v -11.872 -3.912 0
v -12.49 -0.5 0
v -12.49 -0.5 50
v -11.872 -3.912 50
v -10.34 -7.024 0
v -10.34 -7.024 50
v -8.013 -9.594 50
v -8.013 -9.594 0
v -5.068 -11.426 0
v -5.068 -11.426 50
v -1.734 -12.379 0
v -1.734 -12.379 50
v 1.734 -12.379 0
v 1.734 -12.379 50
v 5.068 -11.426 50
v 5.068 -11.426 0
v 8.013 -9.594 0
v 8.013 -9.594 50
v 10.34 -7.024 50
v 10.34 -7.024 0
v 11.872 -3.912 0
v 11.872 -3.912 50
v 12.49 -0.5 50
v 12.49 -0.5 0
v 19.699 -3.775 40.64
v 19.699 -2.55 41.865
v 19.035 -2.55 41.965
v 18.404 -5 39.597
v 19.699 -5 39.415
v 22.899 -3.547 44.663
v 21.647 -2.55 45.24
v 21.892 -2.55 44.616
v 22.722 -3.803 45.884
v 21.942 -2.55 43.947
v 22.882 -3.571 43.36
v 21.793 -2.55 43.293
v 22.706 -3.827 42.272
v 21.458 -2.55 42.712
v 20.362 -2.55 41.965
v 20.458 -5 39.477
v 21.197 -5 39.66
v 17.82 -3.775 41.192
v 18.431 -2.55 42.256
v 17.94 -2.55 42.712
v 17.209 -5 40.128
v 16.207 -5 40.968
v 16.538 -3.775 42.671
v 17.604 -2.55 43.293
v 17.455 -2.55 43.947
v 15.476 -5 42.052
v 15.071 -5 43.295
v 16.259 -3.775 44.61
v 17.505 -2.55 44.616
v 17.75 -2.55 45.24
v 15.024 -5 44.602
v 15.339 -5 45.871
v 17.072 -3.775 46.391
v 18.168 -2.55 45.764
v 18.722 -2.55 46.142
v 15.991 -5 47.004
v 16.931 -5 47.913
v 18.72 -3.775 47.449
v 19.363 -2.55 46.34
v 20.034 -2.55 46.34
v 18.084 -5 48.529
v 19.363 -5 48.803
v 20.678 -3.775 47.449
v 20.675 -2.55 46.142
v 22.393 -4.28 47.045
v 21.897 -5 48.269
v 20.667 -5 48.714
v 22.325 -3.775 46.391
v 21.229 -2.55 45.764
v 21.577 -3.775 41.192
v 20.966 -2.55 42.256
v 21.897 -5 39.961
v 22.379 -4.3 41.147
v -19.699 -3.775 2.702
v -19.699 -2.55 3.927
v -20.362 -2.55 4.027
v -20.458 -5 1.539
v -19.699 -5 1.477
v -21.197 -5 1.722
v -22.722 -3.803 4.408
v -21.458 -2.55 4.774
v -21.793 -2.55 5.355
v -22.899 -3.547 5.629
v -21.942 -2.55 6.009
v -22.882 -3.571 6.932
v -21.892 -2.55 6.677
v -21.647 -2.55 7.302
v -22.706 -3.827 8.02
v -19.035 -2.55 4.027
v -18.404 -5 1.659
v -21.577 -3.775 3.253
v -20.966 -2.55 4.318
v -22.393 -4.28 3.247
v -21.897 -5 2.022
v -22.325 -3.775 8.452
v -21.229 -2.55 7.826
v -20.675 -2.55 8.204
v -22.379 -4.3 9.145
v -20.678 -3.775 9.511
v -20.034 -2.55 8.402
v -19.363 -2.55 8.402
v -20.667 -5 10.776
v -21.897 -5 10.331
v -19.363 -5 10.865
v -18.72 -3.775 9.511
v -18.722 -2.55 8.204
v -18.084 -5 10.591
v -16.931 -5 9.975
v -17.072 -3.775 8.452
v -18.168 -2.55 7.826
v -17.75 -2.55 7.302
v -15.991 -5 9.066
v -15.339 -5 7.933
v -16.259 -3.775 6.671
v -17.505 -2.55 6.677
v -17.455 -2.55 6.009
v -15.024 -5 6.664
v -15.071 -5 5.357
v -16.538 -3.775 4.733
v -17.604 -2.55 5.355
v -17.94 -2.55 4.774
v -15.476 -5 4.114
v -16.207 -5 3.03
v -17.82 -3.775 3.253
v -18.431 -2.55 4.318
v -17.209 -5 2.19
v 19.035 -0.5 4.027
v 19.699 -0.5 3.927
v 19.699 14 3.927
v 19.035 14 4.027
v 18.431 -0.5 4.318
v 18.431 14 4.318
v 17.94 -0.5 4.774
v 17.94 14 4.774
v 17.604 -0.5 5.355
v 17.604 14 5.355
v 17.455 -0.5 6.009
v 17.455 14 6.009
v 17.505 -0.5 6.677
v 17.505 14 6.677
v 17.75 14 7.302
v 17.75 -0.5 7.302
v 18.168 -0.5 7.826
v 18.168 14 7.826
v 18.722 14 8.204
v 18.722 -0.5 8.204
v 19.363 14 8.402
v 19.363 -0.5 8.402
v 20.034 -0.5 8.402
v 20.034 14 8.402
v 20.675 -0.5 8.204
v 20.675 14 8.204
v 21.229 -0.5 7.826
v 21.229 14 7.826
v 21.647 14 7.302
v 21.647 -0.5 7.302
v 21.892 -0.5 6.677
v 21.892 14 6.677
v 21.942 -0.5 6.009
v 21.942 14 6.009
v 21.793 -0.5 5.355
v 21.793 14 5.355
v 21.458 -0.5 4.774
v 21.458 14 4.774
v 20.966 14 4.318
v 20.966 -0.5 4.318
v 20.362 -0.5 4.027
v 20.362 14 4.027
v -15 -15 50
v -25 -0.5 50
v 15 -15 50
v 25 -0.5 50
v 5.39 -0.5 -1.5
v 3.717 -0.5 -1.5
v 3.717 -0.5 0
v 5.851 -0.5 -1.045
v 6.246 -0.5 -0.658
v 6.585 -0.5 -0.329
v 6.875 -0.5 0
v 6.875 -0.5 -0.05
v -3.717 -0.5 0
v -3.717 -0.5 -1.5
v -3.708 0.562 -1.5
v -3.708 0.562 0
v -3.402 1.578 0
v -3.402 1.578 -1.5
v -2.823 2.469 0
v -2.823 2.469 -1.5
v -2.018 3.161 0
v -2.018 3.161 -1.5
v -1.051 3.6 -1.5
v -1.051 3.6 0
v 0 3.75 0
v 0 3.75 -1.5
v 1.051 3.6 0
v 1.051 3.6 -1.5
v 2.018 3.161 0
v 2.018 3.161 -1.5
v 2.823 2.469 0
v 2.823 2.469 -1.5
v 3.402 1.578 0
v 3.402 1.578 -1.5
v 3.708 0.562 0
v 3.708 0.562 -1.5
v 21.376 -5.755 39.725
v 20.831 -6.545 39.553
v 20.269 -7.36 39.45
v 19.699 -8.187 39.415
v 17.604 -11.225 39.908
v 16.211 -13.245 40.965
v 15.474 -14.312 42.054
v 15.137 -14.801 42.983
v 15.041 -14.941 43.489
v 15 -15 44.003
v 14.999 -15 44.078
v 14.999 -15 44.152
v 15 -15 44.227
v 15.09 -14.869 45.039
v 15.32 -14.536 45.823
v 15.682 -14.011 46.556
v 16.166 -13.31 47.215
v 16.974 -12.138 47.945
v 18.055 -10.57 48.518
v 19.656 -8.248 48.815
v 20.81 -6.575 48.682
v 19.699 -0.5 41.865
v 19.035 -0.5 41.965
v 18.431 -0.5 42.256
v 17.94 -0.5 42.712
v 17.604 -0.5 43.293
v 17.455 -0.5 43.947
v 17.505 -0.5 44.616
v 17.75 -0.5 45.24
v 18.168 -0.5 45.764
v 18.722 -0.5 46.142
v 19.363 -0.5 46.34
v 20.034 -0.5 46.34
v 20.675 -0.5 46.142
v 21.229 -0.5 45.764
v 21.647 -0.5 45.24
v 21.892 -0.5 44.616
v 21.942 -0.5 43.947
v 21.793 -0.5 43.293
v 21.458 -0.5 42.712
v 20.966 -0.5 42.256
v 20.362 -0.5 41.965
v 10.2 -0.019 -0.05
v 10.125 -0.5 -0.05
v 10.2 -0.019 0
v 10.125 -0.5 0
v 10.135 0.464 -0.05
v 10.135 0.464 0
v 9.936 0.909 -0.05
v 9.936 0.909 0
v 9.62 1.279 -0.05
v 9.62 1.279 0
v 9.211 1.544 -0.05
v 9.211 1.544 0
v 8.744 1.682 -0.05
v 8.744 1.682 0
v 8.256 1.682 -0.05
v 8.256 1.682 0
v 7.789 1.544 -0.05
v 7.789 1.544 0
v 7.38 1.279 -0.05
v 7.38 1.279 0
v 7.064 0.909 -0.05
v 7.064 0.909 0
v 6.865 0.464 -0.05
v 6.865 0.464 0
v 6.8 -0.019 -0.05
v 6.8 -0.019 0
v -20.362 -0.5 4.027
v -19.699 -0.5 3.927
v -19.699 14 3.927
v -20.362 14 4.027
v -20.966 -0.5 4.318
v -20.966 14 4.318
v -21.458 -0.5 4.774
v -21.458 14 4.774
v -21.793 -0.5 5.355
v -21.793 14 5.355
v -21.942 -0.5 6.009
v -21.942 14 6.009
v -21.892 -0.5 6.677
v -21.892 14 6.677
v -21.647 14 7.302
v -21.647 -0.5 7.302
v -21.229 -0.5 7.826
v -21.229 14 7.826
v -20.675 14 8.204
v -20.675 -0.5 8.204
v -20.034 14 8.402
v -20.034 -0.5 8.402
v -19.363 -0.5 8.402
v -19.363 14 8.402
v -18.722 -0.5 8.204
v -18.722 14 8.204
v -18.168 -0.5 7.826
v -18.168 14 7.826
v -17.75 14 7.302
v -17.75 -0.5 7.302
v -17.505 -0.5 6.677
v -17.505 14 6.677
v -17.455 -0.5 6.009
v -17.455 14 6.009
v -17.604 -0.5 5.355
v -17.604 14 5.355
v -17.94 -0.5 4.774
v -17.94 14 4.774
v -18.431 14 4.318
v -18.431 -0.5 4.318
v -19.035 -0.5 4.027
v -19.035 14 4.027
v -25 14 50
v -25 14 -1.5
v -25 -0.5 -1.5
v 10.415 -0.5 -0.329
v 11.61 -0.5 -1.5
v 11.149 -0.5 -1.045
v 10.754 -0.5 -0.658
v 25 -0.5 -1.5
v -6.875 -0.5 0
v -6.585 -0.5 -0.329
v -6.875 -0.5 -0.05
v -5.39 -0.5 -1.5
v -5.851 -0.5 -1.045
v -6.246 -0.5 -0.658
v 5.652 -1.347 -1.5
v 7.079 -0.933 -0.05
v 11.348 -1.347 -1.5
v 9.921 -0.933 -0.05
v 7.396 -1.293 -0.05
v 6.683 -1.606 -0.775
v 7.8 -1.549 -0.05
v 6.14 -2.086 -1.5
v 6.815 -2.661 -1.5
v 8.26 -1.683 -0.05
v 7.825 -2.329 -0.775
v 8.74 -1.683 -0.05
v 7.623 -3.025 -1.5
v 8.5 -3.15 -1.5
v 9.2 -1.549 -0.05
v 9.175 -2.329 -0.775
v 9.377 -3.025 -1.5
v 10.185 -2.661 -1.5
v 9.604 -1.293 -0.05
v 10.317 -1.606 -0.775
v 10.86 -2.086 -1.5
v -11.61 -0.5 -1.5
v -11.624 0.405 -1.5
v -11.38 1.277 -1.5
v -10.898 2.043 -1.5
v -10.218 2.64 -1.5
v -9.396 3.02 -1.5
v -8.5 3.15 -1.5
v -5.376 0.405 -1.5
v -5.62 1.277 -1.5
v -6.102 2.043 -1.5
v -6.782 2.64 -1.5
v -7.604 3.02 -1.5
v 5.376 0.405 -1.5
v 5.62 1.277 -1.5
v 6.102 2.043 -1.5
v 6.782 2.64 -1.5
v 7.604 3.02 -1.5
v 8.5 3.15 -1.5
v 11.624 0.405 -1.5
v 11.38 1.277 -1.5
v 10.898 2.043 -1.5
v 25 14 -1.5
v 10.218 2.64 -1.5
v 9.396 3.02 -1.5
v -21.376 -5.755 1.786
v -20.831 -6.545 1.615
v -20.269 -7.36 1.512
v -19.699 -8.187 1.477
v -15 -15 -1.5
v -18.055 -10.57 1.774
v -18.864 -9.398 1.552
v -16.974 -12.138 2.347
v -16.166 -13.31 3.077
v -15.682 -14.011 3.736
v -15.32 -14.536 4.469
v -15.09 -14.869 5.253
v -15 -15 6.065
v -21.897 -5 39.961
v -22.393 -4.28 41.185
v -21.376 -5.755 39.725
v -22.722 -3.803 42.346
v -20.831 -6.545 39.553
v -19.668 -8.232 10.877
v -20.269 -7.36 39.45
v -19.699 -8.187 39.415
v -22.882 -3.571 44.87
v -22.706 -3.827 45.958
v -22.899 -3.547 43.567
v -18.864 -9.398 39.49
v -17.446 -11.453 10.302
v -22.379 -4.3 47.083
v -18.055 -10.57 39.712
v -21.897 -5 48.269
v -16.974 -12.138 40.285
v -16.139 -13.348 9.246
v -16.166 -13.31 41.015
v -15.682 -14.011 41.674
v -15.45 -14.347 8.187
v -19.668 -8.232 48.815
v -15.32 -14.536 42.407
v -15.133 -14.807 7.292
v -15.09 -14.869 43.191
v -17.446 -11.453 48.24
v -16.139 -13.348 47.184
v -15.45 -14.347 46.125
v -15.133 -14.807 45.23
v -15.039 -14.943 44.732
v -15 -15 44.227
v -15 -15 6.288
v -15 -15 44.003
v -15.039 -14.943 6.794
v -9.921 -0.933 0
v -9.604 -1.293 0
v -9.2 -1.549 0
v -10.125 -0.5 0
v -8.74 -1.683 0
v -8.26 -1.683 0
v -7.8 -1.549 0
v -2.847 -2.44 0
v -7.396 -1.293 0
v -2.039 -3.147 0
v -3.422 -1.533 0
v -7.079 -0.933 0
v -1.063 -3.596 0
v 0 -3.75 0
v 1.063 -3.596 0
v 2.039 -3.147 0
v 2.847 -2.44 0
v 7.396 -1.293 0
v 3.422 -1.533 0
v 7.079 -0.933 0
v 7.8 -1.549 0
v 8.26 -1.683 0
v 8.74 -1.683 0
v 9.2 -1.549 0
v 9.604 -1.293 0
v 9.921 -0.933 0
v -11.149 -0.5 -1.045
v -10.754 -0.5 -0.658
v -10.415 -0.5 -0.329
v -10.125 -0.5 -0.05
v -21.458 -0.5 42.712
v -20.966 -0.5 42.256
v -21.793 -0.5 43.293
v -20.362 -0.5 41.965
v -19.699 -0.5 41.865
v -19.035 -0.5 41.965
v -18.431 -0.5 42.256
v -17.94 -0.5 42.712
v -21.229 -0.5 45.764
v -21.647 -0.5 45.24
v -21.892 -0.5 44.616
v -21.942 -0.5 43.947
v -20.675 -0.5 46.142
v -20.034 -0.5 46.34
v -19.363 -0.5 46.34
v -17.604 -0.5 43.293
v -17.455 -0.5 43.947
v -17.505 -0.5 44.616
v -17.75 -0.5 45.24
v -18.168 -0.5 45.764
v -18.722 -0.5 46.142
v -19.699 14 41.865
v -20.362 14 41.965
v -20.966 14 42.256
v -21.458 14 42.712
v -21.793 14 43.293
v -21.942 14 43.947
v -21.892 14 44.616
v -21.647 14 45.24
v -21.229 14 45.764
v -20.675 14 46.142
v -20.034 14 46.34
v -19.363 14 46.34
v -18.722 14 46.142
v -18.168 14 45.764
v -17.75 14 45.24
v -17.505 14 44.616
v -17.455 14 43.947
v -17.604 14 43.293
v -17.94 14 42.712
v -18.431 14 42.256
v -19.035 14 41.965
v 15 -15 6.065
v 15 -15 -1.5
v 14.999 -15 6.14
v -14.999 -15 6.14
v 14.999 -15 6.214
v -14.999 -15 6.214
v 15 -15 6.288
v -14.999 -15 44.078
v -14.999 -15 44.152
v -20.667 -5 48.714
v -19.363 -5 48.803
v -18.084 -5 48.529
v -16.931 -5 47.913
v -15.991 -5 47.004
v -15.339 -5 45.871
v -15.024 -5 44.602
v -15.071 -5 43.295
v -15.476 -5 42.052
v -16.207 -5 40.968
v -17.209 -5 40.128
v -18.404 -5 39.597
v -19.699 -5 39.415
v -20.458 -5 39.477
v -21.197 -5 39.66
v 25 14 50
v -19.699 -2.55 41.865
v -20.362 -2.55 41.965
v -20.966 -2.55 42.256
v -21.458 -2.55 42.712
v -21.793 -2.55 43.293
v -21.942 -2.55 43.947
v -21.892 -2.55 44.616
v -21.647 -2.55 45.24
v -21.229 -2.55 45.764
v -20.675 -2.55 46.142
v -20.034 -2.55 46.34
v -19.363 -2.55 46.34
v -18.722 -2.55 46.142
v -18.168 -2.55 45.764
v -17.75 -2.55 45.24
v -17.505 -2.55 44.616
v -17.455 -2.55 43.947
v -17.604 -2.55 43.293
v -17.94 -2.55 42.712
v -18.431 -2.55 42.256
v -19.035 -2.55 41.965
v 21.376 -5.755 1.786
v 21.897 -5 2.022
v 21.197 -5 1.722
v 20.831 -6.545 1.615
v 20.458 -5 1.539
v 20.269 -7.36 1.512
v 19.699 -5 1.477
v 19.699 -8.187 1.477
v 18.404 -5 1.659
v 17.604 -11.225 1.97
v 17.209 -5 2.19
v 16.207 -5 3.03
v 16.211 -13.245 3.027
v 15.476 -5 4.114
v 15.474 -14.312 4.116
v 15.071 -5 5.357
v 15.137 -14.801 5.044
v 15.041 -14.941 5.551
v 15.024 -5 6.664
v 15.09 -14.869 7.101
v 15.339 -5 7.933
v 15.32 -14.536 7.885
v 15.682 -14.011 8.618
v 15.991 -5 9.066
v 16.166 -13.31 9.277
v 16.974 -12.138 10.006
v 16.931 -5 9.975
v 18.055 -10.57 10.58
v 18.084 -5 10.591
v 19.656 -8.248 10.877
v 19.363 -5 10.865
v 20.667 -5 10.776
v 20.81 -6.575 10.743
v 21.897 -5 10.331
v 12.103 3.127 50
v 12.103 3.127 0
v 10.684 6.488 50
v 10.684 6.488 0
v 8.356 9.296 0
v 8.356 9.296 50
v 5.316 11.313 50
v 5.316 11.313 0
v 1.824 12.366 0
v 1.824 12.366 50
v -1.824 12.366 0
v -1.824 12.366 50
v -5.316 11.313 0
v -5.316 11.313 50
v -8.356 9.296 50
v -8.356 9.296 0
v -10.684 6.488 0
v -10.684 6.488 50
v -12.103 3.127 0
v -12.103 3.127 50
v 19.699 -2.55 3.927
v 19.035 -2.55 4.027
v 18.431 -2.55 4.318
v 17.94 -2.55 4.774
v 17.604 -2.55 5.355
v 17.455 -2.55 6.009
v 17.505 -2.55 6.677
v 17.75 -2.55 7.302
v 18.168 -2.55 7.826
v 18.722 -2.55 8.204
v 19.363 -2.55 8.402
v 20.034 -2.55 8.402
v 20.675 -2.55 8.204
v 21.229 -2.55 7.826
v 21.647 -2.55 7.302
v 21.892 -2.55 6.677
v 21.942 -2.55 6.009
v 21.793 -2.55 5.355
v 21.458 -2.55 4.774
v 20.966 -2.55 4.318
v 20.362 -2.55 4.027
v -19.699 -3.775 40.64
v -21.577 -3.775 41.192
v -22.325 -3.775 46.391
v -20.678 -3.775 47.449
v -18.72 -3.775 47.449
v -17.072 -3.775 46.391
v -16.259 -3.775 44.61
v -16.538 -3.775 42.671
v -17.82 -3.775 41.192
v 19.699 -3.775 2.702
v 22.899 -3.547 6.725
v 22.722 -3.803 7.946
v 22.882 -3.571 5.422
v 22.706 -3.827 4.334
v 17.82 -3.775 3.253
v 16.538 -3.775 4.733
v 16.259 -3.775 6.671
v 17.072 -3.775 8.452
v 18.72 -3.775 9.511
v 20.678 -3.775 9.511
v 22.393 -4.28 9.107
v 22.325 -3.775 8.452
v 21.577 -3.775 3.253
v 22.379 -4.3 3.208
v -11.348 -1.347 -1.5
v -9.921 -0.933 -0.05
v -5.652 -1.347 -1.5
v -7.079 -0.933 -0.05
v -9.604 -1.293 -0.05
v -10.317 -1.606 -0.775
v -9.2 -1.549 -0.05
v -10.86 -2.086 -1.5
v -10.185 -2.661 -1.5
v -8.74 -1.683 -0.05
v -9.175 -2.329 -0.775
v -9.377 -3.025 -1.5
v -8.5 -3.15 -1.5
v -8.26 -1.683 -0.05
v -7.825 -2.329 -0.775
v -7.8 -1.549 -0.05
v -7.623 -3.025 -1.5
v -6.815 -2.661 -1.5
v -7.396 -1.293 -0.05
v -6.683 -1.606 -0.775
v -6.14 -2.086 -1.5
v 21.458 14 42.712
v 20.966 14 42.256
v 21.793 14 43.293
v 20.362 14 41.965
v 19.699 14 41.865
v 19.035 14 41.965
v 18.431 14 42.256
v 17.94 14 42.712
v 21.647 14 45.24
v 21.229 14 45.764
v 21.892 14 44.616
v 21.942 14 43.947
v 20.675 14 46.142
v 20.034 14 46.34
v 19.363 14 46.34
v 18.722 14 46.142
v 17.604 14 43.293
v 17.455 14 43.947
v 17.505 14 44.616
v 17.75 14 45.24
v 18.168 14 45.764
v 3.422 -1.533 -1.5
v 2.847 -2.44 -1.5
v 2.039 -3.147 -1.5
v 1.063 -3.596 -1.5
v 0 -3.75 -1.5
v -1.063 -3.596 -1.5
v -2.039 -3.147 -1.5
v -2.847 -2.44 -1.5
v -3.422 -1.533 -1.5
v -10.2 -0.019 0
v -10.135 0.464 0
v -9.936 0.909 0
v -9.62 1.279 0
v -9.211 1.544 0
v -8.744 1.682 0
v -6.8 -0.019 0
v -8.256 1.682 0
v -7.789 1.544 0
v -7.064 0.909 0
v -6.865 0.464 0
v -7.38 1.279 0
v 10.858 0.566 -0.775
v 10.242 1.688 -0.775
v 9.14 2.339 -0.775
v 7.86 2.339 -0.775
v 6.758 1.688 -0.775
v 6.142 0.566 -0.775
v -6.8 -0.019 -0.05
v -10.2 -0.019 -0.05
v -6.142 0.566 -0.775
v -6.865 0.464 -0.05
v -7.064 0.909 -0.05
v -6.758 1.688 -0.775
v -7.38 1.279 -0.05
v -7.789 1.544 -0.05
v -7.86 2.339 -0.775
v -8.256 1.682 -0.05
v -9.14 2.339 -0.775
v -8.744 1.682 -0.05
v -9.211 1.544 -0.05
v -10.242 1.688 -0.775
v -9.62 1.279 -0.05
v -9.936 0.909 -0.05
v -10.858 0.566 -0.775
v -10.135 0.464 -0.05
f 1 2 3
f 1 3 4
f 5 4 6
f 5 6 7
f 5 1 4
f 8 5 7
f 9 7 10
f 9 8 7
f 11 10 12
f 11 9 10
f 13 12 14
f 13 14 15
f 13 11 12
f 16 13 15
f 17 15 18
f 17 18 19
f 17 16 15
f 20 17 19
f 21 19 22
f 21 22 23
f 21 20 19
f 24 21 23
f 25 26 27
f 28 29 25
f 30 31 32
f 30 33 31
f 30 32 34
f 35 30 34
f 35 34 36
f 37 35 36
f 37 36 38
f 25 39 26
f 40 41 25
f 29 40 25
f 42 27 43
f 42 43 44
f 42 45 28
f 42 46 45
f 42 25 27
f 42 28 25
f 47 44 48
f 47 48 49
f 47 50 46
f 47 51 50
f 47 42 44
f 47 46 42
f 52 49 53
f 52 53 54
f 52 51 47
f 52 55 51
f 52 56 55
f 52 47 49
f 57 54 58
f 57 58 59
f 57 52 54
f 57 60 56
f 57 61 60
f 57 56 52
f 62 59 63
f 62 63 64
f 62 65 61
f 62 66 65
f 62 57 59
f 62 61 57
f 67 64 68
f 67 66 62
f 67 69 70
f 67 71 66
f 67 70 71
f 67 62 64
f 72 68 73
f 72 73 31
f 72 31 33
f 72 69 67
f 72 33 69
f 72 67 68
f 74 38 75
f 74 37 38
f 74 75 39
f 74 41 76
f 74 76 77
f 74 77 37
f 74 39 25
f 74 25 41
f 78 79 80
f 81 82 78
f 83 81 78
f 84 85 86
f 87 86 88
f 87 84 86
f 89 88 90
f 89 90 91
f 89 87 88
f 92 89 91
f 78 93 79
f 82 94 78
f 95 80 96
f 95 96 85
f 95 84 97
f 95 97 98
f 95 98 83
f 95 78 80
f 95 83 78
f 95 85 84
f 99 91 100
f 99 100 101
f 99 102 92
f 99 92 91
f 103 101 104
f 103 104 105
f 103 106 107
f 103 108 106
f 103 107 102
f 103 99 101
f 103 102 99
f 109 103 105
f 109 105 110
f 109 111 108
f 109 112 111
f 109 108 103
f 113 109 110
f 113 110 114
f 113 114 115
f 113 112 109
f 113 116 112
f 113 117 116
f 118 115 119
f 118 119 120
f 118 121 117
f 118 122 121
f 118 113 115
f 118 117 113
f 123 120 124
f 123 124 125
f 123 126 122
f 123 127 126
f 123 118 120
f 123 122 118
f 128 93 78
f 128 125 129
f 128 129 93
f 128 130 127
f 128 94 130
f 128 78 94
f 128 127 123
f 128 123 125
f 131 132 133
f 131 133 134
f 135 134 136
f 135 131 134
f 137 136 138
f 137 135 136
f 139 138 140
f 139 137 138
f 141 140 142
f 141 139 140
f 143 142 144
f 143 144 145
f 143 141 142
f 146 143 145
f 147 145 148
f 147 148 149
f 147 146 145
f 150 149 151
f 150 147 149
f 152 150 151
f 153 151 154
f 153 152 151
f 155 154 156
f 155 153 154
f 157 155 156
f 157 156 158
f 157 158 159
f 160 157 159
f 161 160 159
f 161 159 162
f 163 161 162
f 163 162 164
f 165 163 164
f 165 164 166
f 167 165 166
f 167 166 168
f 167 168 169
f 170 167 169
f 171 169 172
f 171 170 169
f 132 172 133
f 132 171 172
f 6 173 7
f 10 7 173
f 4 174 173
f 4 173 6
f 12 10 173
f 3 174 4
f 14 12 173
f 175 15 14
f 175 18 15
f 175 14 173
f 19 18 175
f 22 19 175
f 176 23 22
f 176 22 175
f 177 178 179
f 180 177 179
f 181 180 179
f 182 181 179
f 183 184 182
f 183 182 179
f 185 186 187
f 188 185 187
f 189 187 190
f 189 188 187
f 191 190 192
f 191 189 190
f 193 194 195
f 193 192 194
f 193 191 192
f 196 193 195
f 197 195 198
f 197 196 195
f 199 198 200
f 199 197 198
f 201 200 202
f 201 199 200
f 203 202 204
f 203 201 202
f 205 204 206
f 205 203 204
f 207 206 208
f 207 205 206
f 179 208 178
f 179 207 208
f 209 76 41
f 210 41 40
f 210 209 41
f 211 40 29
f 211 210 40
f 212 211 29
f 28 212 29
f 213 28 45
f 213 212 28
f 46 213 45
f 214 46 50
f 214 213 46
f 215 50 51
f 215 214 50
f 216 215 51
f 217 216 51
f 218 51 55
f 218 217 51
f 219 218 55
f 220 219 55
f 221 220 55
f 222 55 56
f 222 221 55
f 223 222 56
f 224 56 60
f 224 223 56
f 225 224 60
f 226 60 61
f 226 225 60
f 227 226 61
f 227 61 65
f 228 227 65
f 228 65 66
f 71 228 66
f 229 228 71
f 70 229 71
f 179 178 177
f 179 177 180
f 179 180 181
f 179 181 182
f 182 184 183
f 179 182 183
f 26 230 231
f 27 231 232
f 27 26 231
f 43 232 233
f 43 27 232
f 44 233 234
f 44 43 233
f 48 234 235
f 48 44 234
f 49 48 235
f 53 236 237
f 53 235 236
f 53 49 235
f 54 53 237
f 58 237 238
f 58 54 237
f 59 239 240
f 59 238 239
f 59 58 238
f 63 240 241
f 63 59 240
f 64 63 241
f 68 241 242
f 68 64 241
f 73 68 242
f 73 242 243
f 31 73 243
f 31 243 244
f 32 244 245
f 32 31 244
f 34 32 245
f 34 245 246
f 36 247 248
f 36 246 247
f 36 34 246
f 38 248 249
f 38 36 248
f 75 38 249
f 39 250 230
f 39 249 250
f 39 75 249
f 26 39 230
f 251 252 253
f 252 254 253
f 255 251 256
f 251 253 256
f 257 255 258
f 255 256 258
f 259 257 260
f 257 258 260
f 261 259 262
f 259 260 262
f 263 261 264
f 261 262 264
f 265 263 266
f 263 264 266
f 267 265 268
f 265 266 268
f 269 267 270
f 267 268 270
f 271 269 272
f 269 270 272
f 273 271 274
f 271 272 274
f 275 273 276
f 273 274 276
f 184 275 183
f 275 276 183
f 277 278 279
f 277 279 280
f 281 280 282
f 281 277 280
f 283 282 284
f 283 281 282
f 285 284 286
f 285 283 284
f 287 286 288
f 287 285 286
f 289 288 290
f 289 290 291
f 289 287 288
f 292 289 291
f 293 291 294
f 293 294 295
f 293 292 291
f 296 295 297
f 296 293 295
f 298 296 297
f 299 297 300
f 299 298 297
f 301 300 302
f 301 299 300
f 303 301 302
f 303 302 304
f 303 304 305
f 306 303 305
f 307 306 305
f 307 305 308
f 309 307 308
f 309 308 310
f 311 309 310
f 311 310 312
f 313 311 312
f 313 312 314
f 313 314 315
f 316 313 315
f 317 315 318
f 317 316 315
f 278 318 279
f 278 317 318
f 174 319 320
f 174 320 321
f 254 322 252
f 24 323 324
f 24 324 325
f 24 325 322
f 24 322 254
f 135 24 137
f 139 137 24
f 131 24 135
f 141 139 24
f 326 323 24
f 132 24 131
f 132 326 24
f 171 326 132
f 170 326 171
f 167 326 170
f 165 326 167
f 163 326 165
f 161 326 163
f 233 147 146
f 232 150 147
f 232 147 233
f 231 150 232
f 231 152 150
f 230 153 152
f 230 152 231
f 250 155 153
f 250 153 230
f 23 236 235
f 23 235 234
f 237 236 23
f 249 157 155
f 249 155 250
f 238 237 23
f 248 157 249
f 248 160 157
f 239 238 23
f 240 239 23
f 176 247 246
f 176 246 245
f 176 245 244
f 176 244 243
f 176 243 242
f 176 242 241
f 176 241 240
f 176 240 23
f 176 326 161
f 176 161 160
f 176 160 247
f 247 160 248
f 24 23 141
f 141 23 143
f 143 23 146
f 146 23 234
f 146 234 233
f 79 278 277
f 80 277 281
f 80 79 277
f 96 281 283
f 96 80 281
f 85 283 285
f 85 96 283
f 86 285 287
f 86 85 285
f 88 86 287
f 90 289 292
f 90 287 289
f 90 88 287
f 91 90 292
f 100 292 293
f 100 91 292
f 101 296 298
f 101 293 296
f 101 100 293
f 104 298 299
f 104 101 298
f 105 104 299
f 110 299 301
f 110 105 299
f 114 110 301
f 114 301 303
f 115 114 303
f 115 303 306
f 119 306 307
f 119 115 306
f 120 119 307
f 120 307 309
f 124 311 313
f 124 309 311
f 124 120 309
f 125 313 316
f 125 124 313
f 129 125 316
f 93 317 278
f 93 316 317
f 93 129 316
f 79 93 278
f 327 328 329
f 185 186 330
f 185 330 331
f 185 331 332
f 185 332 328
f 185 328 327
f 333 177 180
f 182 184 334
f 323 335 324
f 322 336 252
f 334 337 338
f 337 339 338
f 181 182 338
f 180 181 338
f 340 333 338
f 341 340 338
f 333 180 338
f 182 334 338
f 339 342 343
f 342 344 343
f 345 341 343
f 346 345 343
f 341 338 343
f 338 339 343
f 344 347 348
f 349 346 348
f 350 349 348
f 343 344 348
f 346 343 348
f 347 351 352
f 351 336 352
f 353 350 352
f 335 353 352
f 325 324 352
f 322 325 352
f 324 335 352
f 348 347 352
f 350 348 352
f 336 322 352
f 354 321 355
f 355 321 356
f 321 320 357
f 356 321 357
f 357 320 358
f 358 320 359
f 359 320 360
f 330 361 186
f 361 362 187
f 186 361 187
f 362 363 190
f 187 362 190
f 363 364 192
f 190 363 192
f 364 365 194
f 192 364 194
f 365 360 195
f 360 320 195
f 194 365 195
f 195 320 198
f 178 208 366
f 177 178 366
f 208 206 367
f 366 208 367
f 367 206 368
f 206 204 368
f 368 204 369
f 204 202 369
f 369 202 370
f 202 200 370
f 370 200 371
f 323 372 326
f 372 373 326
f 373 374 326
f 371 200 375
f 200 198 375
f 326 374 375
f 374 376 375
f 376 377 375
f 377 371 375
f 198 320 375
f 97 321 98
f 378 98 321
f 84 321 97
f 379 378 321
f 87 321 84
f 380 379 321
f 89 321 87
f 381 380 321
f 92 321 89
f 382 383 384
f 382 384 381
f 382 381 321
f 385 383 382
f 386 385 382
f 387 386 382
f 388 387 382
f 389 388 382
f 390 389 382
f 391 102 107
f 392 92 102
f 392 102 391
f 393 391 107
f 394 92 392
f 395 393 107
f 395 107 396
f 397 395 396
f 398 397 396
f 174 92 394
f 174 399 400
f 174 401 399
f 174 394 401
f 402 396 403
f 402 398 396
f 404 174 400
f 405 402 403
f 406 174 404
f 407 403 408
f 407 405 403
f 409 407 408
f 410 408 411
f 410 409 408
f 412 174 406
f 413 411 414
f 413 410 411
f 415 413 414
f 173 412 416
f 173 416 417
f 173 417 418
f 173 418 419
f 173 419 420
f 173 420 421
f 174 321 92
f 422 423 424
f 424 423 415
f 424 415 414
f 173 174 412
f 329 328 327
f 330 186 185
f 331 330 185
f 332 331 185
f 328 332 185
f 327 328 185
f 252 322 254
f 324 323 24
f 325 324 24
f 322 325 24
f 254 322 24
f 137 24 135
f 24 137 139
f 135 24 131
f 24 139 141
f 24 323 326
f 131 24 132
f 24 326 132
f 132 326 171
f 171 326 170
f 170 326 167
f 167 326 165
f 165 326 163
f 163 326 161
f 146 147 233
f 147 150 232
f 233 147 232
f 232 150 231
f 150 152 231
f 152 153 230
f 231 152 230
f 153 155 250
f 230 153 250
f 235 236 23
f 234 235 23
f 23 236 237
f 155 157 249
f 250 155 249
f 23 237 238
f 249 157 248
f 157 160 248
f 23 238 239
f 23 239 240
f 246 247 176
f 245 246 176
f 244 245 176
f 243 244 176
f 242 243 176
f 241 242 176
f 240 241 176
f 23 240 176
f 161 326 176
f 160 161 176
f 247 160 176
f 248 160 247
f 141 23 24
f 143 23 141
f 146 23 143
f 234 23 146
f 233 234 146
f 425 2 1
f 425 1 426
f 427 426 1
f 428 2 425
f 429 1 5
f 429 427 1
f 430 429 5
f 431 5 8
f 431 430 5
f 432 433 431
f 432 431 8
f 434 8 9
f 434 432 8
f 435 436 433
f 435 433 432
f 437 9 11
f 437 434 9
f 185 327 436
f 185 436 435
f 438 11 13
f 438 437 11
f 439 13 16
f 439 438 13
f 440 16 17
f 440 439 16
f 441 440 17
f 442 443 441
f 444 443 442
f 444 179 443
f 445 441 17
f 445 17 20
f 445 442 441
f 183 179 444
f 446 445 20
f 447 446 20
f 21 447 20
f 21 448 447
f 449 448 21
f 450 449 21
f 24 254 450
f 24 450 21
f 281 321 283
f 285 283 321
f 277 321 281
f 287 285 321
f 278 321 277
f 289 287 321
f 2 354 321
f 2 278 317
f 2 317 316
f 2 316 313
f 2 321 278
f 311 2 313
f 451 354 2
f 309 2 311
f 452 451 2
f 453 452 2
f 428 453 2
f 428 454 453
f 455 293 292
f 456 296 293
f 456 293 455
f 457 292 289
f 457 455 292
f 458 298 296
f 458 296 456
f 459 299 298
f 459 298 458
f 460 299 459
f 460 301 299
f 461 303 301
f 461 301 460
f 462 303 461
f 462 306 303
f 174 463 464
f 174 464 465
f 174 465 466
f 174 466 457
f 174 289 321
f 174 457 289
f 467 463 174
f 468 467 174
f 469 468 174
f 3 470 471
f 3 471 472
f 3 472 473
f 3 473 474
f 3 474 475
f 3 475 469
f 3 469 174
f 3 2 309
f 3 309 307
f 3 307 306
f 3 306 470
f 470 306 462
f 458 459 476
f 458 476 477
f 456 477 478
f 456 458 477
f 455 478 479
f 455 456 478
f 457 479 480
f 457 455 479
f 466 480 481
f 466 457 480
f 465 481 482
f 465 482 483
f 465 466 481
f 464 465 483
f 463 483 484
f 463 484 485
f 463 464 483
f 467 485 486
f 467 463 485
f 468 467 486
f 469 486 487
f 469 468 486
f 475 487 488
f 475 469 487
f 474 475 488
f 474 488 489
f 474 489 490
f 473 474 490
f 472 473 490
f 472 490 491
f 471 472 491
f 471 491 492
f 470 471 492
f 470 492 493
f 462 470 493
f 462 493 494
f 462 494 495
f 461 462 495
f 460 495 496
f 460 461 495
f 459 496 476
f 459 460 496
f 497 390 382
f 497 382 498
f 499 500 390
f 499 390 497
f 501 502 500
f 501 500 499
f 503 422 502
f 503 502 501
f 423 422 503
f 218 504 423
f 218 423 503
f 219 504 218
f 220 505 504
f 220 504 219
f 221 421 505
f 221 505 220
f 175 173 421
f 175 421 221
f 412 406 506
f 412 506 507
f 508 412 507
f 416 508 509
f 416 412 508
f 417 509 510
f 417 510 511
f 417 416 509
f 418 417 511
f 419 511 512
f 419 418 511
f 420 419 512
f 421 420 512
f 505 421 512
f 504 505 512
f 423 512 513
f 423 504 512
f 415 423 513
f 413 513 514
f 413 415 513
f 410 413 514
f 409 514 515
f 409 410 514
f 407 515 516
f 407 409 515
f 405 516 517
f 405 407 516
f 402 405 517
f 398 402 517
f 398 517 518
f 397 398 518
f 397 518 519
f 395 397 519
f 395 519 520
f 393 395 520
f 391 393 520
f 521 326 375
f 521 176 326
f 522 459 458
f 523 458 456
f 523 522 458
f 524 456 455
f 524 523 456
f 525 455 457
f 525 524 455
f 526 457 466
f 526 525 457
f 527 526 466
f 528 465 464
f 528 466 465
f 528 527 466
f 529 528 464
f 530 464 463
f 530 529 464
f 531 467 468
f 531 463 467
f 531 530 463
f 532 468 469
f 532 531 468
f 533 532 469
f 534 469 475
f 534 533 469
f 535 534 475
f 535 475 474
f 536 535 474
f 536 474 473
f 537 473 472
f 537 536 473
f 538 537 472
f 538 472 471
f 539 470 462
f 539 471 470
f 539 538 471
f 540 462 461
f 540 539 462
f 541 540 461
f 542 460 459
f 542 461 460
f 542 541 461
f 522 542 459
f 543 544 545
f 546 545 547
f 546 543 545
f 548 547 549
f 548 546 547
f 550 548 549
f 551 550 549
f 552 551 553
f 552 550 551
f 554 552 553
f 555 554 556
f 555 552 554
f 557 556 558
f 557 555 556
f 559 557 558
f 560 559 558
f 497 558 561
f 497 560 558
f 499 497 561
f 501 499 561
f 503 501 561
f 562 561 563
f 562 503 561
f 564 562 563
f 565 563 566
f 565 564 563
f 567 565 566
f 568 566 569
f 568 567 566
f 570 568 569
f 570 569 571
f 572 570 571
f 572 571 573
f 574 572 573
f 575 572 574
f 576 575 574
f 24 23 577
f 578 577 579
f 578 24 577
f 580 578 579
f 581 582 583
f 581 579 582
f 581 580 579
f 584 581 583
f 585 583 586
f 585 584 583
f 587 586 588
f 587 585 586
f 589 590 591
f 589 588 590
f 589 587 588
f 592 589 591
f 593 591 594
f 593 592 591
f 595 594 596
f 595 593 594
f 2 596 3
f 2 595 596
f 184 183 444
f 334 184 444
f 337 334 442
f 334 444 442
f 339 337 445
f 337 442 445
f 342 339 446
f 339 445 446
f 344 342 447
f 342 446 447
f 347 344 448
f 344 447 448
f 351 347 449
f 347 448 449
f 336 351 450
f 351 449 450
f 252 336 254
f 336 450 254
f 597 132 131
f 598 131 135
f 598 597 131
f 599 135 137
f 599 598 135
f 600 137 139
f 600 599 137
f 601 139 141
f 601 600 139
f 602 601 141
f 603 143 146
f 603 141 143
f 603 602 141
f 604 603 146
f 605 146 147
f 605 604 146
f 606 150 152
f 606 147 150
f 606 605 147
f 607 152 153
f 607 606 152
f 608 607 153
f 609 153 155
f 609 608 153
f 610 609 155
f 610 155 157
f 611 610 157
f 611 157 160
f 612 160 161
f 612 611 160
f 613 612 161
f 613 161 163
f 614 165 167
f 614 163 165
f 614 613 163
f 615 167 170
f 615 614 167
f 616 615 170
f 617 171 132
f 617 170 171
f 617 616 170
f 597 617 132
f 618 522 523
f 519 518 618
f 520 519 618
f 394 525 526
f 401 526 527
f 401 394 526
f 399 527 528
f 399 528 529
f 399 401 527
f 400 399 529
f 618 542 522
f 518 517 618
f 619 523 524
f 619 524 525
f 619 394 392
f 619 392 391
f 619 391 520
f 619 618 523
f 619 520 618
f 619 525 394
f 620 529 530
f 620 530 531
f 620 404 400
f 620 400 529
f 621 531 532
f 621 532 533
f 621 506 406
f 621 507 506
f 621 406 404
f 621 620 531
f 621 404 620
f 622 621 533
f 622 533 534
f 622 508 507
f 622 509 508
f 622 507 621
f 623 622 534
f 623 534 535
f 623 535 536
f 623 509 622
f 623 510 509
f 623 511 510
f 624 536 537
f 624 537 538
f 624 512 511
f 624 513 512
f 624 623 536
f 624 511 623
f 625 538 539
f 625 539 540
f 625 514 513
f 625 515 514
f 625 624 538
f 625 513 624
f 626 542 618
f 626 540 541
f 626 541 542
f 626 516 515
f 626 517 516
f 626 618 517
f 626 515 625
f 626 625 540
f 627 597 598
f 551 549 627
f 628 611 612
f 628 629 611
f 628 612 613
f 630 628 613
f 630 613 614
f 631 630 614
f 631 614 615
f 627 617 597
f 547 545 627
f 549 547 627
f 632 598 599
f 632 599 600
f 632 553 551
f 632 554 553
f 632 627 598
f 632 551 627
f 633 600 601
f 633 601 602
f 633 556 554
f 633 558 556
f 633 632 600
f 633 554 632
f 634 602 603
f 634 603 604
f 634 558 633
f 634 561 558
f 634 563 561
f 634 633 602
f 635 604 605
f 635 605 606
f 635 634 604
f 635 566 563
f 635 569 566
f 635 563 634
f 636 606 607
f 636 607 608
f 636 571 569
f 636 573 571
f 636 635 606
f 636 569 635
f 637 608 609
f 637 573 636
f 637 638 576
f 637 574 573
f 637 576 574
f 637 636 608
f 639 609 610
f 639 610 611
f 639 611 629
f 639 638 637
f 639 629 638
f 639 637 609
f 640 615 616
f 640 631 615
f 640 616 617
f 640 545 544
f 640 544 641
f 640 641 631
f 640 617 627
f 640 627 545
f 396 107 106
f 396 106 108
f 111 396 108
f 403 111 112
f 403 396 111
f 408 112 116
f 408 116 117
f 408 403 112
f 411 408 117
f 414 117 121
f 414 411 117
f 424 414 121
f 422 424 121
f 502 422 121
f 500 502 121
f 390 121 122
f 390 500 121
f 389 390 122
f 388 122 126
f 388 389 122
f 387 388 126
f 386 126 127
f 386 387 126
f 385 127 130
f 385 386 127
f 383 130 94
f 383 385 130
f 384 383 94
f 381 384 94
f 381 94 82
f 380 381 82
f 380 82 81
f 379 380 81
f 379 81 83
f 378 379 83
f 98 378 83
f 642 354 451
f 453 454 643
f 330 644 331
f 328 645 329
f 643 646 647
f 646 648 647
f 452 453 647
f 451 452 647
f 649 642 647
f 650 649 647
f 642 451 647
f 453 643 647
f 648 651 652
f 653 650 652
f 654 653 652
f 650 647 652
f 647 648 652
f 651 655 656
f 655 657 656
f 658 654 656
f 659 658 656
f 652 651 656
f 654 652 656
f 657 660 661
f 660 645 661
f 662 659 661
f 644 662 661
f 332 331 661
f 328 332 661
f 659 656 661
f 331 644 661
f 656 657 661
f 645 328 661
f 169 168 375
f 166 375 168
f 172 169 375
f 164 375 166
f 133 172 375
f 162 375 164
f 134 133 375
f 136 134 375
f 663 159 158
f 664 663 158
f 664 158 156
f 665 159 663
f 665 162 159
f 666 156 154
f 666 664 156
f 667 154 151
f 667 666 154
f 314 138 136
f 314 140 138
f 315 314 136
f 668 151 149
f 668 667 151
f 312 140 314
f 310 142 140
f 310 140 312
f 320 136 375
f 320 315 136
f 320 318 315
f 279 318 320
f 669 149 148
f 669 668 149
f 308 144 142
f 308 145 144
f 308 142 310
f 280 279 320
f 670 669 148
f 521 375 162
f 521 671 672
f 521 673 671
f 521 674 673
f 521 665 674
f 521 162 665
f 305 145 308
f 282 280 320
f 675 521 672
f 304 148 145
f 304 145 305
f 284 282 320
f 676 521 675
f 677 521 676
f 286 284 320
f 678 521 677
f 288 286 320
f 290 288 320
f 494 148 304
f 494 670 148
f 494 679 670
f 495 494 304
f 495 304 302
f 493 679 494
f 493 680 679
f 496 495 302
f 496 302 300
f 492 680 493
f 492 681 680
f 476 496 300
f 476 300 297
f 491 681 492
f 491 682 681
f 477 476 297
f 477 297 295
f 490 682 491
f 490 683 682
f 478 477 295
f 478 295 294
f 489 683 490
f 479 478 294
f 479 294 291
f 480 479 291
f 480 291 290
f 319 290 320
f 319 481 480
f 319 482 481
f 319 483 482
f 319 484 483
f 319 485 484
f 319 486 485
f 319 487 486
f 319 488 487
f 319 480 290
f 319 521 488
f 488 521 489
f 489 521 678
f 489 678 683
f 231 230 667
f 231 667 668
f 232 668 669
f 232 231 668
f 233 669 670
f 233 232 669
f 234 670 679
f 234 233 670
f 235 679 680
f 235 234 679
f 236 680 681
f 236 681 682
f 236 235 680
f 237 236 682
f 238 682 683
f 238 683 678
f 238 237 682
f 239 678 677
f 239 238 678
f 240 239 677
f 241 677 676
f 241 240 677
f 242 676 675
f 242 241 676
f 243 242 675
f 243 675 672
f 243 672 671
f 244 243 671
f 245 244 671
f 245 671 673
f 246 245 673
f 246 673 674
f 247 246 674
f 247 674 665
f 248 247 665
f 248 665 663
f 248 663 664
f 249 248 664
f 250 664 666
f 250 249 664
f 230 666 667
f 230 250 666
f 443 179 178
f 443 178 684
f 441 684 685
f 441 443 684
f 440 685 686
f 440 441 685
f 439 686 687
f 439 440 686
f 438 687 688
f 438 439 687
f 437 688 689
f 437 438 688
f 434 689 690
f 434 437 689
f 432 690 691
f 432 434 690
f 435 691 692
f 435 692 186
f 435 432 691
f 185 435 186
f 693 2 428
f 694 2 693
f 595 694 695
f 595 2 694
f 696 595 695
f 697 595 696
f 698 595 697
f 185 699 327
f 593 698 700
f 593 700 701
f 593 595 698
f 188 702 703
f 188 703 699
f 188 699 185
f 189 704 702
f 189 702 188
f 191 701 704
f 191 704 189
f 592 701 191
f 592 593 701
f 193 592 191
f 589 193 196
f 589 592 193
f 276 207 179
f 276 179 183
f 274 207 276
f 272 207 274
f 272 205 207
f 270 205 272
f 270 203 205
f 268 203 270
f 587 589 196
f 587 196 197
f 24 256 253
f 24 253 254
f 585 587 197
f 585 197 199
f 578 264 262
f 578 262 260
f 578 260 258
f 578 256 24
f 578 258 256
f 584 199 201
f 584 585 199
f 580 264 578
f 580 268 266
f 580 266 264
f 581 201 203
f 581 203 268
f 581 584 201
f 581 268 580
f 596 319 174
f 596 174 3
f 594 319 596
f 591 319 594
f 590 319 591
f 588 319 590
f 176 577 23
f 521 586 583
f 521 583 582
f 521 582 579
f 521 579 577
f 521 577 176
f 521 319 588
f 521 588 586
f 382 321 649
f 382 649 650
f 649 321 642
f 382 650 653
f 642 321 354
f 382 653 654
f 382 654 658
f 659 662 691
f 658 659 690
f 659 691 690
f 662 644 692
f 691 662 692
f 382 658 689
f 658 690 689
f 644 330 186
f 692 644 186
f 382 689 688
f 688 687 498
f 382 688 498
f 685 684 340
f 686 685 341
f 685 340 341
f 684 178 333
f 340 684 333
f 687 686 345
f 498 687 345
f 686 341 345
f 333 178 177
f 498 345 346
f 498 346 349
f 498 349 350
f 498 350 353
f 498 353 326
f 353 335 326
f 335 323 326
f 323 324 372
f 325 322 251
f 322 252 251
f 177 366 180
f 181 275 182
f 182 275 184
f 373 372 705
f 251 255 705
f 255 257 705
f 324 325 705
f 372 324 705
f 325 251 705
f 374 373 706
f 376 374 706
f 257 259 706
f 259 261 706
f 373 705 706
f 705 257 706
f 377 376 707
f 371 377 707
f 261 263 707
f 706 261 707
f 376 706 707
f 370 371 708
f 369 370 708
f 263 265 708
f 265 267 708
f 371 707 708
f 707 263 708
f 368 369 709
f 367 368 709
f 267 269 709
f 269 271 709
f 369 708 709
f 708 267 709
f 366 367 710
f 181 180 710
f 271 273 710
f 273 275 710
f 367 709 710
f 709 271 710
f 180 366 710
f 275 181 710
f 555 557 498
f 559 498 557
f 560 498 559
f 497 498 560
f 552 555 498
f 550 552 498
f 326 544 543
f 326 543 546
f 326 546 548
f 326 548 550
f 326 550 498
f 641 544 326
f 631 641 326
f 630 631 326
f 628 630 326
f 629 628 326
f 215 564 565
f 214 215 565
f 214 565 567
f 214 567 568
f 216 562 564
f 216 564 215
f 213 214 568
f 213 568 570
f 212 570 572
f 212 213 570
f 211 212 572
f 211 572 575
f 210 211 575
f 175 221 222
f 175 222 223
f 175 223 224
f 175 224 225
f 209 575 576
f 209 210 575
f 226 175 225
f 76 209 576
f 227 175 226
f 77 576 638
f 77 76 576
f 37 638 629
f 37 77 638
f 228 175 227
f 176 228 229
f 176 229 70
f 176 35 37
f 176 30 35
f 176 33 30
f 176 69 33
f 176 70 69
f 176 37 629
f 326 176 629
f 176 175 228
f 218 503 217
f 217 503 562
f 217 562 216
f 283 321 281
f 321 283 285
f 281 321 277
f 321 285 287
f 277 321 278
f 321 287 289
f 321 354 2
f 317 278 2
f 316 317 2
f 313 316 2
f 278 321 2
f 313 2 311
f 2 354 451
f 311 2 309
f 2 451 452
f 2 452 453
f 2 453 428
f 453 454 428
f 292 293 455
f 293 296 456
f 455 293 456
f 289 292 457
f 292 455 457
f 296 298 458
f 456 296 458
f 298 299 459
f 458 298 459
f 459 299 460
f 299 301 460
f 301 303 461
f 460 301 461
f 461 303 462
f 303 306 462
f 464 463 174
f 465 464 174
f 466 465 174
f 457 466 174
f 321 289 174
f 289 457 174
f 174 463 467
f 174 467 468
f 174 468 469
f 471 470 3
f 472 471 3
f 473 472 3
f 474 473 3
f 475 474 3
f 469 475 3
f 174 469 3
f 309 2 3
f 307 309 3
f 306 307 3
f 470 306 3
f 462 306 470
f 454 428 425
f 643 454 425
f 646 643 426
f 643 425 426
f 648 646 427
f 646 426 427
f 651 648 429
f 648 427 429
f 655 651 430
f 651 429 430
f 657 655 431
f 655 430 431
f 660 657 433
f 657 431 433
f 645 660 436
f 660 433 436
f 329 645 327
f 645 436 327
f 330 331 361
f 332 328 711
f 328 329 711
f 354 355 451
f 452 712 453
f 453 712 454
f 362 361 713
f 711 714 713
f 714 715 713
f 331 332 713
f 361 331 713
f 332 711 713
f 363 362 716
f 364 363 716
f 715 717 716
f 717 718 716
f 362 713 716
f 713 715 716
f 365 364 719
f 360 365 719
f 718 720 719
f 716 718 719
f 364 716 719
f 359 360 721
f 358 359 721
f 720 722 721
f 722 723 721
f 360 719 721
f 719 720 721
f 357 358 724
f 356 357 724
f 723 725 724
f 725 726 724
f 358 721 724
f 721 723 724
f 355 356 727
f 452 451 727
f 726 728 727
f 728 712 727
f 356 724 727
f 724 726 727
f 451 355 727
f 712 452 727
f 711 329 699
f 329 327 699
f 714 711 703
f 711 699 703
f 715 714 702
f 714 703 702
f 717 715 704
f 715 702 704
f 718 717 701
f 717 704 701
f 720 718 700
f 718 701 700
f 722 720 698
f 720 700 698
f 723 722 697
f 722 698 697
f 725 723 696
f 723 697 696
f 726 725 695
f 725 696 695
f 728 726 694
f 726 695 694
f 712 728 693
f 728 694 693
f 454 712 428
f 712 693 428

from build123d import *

# Parameters (mm, degrees)
ESQUISSE1_W                                    = 10
ESQUISSE1_H                                    = 14.5
ESQUISSE1_W_2                                  = 30
ESQUISSE1_H_2                                  = 29
ESQUISSE1_R                                    = 12.5
BOSS_EXTRU_1_DEPTH                             = 50
FRAISAGE_POUR_VIS_T_TE_FRAIS_E_M41_AT_COUNT    = 2
FRAISAGE_POUR_VIS_T_TE_FRAIS_E_M41_AT_PITCH    = 39.397349882
FRAISAGE_POUR_VIS_T_TE_FRAIS_E_M41_2_COUNT     = 2
FRAISAGE_POUR_VIS_T_TE_FRAIS_E_M41_2_PITCH     = 54.694216744
FRAISAGE_POUR_VIS_T_TE_FRAIS_E_M41_3_COUNT     = 2
FRAISAGE_POUR_VIS_T_TE_FRAIS_E_M41_3_PITCH     = 37.938188775
ESQUISSE26_R                                   = 3.75
BOSS_EXTRU_2_DEPTH                             = 1.5
FRAISAGE_POUR_VIS_T_TE_FRAIS_E_M31_D           = 3.4
FRAISAGE_POUR_VIS_T_TE_FRAIS_E_M31_CSINK_D     = 6.3
FRAISAGE_POUR_VIS_T_TE_FRAIS_E_M31_CSINK_ANGLE = 90


with BuildPart() as part:
    # Esquisse1 → Boss.-Extru.1 (new body)
    # profile 1 of 5: a face of its own
    with BuildSketch(Plane.XY):
        with Locations((-20, 6.75)):
            Rectangle(ESQUISSE1_W, ESQUISSE1_H)
    # profile 2 of 5: a face of its own
    with BuildSketch(Plane.XY):
        Polygon((-15, -15), (-15, -0.5), (-25, -0.5), align=None)
    # profile 3 of 5: a face of its own
    with BuildSketch(Plane.XY):
        with Locations((0, -0.5)):
            Rectangle(ESQUISSE1_W_2, ESQUISSE1_H_2)
        Circle(ESQUISSE1_R, mode=Mode.SUBTRACT)
    # profile 4 of 5: a face of its own
    with BuildSketch(Plane.XY):
        Polygon((25, -0.5), (15, -0.5), (15, -15), align=None)
    # profile 5 of 5: a face of its own
    with BuildSketch(Plane.XY):
        with Locations((20, 6.75)):
            Rectangle(ESQUISSE1_W, ESQUISSE1_H)
    extrude(amount=BOSS_EXTRU_1_DEPTH)

    # Esquisse25 → Fraisage pour vis à tête fraisée M41 (revolve, cut)
    with BuildSketch(Plane(origin=(19.698674941, -15, 6.176821723), x_dir=(0, 0, -1), z_dir=(1, 0, 0))):
        Polygon((0, 0), (0, 29), (2.25, 29), (2.25, 12.45), (4.7, 10), (4.7, 0), align=None)
    fraisage_pour_vis_t_te_frais_e_m41 = revolve(axis=Axis((19.698674941, -21.35, 6.176821723), (0, 1, 0)), mode=Mode.SUBTRACT)

    # Fraisage pour vis à tête fraisée M41 at: Fraisage pour vis à tête fraisée M41 ×2
    with Locations(*[(-i * FRAISAGE_POUR_VIS_T_TE_FRAIS_E_M41_AT_PITCH, 0, 0) for i in range(1, FRAISAGE_POUR_VIS_T_TE_FRAIS_E_M41_AT_COUNT)]):
        add(fraisage_pour_vis_t_te_frais_e_m41, mode=Mode.SUBTRACT)

    # Fraisage pour vis _ t_te frais_e M41 2: Fraisage pour vis à tête fraisée M41 ×2
    with Locations(*[Vector(-0.7203202134914811, 0, 0.6936416870658707) * (i * FRAISAGE_POUR_VIS_T_TE_FRAIS_E_M41_2_PITCH) for i in range(1, FRAISAGE_POUR_VIS_T_TE_FRAIS_E_M41_2_COUNT)]):
        add(fraisage_pour_vis_t_te_frais_e_m41, mode=Mode.SUBTRACT)

    # Fraisage pour vis _ t_te frais_e M41 3: Fraisage pour vis à tête fraisée M41 ×2
    with Locations(*[(0, 0, i * FRAISAGE_POUR_VIS_T_TE_FRAIS_E_M41_3_PITCH) for i in range(1, FRAISAGE_POUR_VIS_T_TE_FRAIS_E_M41_3_COUNT)]):
        add(fraisage_pour_vis_t_te_frais_e_m41, mode=Mode.SUBTRACT)

    # Esquisse26 → Boss.-Extru.2 (add)
    with BuildSketch(Plane(origin=(0, 0, 0), x_dir=(-1, 0, 0), z_dir=(0, 0, -1))):
        Polygon((-25, 14), (25, 14), (25, -0.5), (15, -15), (-15, -15), (-25, -0.5), align=None)
        Circle(ESQUISSE26_R, mode=Mode.SUBTRACT)
    extrude(amount=BOSS_EXTRU_2_DEPTH)

    # Fraisage pour vis à tête fraisée M31 (through all)
    with Locations(Plane(origin=(0, 0, -1.5), x_dir=(-1, 0, 0), z_dir=(0, 0, -1))):
        with Locations((-8.5, 0), (8.5, 0)):
            CounterSinkHole(FRAISAGE_POUR_VIS_T_TE_FRAIS_E_M31_D / 2, FRAISAGE_POUR_VIS_T_TE_FRAIS_E_M31_CSINK_D / 2, counter_sink_angle=FRAISAGE_POUR_VIS_T_TE_FRAIS_E_M31_CSINK_ANGLE)


with BuildPart() as body_2:
    # Fractionner1: the piece on the far side of the plane
    add(part.part)
    split(bisect_by=Plane.ZX.offset(-0.5), keep=Keep.BOTTOM)


with BuildPart() as part_1:
    add(part.part)

    # Fractionner1
    split(bisect_by=Plane.ZX.offset(-0.5), keep=Keep.TOP)


solid = Compound([body_2.part, part_1.part])
